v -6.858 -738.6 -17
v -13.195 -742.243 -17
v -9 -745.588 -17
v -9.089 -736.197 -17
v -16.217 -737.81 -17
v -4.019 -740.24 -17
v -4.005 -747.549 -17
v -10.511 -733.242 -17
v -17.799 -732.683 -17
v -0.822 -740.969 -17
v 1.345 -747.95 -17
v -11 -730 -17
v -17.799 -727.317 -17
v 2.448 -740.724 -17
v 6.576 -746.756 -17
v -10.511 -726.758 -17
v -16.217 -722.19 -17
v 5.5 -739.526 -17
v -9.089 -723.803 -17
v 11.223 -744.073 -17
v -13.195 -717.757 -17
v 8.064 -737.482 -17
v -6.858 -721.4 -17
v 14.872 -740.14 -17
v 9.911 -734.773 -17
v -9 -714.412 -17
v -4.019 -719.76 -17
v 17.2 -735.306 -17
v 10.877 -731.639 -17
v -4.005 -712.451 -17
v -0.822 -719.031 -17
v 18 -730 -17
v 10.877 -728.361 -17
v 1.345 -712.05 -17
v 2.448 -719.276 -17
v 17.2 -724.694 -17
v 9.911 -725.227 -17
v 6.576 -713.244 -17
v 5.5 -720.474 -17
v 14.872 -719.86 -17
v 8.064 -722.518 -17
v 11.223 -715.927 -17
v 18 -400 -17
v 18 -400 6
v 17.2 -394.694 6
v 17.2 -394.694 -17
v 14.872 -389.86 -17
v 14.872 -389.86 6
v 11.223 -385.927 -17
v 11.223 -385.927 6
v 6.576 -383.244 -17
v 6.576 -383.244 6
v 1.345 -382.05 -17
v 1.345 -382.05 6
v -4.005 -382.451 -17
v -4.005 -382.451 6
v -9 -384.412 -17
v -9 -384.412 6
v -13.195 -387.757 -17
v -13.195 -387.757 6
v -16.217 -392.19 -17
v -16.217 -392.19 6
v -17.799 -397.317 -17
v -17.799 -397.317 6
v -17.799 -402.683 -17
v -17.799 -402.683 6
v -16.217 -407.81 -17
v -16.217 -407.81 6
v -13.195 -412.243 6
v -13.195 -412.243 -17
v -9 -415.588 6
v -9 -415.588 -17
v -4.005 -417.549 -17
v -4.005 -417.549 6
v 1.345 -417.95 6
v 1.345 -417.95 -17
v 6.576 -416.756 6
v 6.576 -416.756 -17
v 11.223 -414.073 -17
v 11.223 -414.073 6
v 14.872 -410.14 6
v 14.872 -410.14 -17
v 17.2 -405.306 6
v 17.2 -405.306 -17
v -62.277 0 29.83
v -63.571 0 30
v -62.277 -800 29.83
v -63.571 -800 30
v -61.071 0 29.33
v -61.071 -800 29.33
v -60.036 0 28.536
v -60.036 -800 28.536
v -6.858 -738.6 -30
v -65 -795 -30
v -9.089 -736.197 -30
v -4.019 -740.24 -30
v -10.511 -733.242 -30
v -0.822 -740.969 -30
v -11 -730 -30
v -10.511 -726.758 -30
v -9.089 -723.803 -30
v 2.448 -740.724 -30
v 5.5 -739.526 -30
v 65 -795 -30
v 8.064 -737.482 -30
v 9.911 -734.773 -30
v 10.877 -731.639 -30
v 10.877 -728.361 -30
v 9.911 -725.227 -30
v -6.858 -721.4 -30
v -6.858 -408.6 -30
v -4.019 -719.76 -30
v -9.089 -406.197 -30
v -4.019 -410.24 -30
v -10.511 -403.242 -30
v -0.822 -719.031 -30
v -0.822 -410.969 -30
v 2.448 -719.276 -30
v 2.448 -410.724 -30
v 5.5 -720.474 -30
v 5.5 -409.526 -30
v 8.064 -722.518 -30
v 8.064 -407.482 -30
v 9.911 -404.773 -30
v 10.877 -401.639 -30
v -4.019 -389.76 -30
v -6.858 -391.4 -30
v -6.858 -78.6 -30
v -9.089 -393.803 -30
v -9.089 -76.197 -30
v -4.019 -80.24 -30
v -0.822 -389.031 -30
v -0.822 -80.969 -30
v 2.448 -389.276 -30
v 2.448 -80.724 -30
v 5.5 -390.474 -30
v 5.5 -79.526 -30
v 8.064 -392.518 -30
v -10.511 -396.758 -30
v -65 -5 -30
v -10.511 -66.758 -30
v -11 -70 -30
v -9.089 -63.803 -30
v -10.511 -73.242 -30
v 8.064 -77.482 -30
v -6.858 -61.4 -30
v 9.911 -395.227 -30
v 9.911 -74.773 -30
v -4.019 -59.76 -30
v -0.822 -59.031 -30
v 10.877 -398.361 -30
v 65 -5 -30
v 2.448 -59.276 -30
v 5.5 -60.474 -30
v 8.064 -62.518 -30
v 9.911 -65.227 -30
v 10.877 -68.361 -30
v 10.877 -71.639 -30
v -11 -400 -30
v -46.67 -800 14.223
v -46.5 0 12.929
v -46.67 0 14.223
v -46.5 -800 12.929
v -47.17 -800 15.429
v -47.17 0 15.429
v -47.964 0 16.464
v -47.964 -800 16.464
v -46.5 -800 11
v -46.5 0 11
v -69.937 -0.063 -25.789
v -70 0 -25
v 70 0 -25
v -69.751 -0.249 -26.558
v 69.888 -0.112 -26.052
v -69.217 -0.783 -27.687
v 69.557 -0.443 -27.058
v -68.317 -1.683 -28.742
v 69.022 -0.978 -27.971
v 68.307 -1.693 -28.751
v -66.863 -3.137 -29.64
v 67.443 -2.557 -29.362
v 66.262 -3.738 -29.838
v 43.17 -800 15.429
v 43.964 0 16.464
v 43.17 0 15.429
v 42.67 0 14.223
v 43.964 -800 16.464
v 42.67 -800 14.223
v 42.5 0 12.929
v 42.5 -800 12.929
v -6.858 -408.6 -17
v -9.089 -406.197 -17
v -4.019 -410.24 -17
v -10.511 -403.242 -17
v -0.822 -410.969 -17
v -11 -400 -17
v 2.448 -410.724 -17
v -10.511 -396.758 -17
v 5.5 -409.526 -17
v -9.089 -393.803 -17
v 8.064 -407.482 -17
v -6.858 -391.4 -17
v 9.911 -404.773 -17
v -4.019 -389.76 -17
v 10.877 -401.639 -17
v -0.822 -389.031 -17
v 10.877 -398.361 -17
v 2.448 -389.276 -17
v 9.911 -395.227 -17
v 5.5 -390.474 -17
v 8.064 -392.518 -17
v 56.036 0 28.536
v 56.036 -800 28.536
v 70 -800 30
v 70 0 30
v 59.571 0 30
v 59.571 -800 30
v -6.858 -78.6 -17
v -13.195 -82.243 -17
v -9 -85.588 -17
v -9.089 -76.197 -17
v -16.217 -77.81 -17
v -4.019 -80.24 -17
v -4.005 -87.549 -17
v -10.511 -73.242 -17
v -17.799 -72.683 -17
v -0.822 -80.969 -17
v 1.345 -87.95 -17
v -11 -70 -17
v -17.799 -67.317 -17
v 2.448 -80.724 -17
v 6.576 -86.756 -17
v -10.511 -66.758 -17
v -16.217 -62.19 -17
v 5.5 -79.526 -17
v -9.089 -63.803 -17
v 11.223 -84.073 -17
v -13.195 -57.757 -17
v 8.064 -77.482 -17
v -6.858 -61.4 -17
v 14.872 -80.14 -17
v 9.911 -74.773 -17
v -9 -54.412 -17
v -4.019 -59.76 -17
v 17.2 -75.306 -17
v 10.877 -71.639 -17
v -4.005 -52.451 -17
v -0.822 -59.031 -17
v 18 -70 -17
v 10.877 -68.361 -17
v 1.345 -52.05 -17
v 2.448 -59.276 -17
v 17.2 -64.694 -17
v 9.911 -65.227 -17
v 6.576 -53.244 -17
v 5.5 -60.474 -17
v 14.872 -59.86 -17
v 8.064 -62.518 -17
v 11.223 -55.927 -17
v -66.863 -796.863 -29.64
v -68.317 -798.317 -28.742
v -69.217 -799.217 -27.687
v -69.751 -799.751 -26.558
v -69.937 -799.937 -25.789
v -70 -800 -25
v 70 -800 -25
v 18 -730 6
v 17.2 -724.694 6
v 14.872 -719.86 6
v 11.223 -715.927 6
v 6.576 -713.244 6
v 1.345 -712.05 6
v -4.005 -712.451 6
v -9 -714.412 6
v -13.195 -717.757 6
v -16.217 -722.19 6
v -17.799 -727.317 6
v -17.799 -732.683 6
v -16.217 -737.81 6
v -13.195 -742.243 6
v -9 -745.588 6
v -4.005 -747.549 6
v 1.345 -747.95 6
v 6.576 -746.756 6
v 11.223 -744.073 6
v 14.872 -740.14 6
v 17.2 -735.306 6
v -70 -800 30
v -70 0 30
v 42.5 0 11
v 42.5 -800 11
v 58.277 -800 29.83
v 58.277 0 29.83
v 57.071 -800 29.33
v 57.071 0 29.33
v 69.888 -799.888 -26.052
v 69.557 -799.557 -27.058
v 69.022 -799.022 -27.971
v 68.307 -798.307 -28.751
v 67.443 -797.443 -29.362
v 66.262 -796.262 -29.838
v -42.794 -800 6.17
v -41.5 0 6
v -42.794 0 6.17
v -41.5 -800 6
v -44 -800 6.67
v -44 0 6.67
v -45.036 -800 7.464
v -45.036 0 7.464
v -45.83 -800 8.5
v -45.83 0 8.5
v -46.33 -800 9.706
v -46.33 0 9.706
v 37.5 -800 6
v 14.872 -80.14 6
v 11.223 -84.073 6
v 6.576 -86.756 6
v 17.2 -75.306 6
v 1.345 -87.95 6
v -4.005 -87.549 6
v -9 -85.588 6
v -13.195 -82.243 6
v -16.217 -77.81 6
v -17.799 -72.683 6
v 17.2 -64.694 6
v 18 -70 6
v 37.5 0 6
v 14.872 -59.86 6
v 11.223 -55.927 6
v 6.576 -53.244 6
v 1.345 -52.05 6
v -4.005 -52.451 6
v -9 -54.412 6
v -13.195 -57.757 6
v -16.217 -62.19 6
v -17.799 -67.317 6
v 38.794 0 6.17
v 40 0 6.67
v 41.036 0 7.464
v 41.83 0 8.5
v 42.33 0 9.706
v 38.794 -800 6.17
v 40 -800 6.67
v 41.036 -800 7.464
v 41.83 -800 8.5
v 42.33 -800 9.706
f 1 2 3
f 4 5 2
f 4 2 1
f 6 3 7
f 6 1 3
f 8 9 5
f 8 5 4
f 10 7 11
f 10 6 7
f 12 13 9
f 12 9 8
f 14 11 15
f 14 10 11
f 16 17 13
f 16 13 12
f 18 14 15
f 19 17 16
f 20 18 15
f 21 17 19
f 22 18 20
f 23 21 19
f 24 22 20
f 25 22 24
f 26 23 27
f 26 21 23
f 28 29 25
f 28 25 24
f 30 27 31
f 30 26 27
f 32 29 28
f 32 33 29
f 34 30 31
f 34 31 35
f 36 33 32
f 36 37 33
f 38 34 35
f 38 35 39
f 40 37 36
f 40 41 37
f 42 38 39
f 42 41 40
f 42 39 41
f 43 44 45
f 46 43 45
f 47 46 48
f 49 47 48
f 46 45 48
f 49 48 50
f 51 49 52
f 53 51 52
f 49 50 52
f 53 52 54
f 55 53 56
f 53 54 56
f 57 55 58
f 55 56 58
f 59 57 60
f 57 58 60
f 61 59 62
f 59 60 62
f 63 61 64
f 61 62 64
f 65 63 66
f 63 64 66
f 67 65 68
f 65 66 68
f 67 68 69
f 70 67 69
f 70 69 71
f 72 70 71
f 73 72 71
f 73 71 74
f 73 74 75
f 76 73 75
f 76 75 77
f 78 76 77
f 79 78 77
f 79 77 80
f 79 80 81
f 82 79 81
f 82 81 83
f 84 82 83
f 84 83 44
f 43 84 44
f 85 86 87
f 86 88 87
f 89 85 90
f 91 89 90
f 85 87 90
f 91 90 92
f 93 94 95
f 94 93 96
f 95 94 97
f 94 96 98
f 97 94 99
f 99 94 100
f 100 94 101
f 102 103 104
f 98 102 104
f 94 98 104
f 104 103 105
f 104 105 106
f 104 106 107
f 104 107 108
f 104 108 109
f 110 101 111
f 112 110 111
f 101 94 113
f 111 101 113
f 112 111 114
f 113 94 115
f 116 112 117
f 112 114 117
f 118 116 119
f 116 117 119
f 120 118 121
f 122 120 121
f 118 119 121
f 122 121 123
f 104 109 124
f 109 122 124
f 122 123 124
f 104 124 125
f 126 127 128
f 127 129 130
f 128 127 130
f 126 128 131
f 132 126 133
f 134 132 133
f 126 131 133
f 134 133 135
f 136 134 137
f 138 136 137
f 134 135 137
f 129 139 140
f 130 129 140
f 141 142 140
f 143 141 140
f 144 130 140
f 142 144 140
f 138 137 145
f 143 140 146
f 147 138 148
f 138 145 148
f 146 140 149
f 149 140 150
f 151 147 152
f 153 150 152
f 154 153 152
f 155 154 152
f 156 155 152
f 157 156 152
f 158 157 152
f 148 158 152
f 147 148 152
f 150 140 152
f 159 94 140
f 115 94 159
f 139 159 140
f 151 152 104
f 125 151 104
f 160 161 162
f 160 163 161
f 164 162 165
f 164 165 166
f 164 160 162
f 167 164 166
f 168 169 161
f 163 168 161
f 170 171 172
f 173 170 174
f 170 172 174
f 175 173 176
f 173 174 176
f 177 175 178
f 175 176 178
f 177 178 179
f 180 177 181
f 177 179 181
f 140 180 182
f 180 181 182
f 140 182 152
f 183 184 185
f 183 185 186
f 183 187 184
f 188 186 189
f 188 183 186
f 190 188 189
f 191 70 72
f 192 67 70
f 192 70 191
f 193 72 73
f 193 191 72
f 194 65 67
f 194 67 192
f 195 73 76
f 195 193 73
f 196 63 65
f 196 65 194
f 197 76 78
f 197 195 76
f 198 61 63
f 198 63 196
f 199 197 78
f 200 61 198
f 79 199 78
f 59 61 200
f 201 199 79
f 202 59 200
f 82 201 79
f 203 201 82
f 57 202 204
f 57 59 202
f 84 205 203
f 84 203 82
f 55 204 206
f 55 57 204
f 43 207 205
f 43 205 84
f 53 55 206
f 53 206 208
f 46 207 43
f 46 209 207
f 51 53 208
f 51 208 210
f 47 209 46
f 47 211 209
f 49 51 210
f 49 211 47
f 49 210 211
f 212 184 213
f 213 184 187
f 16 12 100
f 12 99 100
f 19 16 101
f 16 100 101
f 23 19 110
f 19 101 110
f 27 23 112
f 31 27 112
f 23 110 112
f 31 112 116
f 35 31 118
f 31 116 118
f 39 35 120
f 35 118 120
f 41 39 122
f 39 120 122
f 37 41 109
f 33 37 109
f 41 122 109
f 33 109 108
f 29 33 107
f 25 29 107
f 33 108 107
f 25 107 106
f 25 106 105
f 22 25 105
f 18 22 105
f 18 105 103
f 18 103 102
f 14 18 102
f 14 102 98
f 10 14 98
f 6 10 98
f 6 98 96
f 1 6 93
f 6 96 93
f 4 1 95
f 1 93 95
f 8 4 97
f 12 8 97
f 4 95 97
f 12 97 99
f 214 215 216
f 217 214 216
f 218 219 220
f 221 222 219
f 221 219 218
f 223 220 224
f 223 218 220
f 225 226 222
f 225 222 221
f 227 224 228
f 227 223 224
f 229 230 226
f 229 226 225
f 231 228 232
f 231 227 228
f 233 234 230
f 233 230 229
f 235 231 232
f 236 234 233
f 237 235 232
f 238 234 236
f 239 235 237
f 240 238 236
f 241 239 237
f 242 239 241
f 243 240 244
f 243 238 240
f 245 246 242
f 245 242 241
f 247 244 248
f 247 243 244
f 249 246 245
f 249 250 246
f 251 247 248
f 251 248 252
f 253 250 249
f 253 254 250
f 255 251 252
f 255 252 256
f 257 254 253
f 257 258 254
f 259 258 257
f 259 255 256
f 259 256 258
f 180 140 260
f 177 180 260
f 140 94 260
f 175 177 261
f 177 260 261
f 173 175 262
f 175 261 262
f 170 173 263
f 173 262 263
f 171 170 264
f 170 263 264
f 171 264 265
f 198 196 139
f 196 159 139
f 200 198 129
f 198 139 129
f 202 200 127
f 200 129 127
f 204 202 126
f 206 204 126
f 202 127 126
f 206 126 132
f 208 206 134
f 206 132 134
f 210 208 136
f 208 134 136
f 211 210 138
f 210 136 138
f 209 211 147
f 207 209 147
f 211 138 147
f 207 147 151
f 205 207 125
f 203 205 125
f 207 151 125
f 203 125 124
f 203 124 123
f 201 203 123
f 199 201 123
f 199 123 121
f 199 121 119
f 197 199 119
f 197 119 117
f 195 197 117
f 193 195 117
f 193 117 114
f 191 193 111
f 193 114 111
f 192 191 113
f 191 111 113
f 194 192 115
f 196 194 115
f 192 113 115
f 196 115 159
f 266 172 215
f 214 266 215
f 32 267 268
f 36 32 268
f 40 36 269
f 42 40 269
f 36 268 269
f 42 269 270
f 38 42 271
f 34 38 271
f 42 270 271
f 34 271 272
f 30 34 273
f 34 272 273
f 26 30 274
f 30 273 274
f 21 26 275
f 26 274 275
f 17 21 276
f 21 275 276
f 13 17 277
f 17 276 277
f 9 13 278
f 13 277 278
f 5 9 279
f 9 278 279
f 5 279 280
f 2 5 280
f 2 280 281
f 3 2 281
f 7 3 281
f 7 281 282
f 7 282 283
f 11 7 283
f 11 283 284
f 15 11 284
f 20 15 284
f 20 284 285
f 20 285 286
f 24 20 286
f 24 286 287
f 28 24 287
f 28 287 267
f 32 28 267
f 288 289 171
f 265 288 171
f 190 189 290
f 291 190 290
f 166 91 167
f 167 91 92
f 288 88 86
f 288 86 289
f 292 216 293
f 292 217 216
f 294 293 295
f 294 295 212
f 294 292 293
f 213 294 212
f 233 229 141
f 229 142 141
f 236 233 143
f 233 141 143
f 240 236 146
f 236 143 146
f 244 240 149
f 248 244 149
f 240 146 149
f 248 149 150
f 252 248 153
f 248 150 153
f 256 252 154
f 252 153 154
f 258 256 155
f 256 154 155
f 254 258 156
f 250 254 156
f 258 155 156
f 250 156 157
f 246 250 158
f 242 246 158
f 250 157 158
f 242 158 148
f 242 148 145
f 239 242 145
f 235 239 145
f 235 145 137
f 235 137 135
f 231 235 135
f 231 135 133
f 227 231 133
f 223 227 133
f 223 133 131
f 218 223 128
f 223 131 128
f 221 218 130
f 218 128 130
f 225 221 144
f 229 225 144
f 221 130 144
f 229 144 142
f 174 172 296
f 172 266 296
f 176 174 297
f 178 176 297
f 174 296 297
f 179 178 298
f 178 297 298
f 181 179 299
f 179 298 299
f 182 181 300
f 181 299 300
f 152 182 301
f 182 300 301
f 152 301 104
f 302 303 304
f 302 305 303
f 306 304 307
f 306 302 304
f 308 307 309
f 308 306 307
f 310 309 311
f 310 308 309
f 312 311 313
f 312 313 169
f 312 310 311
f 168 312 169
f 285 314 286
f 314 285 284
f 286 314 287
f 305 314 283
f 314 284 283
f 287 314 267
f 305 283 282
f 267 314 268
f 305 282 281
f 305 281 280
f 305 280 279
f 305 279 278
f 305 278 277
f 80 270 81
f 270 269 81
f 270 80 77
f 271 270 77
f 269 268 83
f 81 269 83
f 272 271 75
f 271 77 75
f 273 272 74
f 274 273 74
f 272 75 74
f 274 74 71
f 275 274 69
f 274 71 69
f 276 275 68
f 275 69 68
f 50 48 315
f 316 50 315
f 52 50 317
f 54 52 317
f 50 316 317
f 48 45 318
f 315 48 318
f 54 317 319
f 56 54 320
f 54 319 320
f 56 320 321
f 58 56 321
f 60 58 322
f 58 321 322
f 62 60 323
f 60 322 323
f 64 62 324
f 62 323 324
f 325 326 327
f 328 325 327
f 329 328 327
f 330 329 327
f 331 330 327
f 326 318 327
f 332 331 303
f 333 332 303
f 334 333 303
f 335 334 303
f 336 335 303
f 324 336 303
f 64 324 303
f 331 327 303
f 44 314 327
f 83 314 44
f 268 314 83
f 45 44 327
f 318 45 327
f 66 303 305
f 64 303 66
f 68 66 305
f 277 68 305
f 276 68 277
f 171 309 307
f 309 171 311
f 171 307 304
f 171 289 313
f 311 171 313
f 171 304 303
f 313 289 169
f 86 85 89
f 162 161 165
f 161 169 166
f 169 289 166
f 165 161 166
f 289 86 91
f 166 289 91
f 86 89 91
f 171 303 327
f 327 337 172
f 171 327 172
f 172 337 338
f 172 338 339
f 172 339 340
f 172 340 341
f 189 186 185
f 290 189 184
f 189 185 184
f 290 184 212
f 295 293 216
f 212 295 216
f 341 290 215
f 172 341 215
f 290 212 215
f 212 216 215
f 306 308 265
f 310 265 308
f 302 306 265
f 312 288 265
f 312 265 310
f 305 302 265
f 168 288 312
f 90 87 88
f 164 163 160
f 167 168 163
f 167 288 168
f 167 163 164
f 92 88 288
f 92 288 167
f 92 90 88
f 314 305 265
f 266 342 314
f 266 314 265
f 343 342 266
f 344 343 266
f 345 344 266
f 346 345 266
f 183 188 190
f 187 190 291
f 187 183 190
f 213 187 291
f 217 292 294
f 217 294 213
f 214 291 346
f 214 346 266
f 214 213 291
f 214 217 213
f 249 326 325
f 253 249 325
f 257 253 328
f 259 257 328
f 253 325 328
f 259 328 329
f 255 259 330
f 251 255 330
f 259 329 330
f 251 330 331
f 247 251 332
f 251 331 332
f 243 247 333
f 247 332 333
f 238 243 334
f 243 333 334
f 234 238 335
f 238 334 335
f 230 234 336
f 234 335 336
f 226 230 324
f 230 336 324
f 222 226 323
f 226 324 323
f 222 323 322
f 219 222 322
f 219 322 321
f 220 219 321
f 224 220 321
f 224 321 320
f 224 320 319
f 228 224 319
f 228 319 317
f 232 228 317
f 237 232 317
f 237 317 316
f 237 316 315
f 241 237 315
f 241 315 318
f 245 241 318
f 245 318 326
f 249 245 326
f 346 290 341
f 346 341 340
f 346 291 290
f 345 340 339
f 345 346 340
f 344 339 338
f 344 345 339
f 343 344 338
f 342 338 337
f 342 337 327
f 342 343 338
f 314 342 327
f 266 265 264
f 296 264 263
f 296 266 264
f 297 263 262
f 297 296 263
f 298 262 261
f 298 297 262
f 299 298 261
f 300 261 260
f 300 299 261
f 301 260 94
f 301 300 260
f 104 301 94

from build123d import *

# Parameters (mm, degrees)
F1_DEPTH       = 800
F2_SIZE        = 15
F3_R           = 5
F5_D           = 22
F5_CBORE_D     = 36
F5_CBORE_DEPTH = 23
F6_D           = 22
F6_CBORE_D     = 36
F6_CBORE_DEPTH = 23
F7_D           = 22
F7_CBORE_D     = 36
F7_CBORE_DEPTH = 23


with BuildPart() as f1:
    # F0 (on Front) → F1 (new body)
    with BuildSketch(Plane.XZ):
        Polygon((70, -30), (70, 30), (42.5, 30), (42.5, 6), (-46.5, 6), (-46.5, 30), (-70, 30), (-70, -30), align=None)
    extrude(amount=F1_DEPTH)

    # F2
    f2_edges = [f1.edges().sort_by_distance(p)[0] for p in [
        (-46.5, -400, 30),
        (42.5, -400, 30),
    ]]
    chamfer(f2_edges, length=F2_SIZE)

    # F3
    f3_edges = [f1.edges().sort_by_distance(p)[0] for p in [
        (-61.5, -400, 30),
        (-46.5, -400, 15),
        (-46.5, -400, 6),
        (57.5, -400, 30),
        (42.5, -400, 15),
        (42.5, -400, 6),
        (-70, -400, -30),
        (70, -400, -30),
        (0, -800, -30),
        (0, 0, -30),
    ]]
    fillet(f3_edges, radius=F3_R)

    # F5 (through all)
    with Locations(Plane.XY.offset(6)):
        with Locations((0, -70)):
            CounterBoreHole(F5_D / 2, F5_CBORE_D / 2, F5_CBORE_DEPTH)

    # F6 (through all)
    with Locations(Plane.XY.offset(6)):
        with Locations((0, -400)):
            CounterBoreHole(F6_D / 2, F6_CBORE_D / 2, F6_CBORE_DEPTH)

    # F7 (through all)
    with Locations(Plane.XY.offset(6)):
        with Locations((0, -730)):
            CounterBoreHole(F7_D / 2, F7_CBORE_D / 2, F7_CBORE_DEPTH)


solid = f1.part
